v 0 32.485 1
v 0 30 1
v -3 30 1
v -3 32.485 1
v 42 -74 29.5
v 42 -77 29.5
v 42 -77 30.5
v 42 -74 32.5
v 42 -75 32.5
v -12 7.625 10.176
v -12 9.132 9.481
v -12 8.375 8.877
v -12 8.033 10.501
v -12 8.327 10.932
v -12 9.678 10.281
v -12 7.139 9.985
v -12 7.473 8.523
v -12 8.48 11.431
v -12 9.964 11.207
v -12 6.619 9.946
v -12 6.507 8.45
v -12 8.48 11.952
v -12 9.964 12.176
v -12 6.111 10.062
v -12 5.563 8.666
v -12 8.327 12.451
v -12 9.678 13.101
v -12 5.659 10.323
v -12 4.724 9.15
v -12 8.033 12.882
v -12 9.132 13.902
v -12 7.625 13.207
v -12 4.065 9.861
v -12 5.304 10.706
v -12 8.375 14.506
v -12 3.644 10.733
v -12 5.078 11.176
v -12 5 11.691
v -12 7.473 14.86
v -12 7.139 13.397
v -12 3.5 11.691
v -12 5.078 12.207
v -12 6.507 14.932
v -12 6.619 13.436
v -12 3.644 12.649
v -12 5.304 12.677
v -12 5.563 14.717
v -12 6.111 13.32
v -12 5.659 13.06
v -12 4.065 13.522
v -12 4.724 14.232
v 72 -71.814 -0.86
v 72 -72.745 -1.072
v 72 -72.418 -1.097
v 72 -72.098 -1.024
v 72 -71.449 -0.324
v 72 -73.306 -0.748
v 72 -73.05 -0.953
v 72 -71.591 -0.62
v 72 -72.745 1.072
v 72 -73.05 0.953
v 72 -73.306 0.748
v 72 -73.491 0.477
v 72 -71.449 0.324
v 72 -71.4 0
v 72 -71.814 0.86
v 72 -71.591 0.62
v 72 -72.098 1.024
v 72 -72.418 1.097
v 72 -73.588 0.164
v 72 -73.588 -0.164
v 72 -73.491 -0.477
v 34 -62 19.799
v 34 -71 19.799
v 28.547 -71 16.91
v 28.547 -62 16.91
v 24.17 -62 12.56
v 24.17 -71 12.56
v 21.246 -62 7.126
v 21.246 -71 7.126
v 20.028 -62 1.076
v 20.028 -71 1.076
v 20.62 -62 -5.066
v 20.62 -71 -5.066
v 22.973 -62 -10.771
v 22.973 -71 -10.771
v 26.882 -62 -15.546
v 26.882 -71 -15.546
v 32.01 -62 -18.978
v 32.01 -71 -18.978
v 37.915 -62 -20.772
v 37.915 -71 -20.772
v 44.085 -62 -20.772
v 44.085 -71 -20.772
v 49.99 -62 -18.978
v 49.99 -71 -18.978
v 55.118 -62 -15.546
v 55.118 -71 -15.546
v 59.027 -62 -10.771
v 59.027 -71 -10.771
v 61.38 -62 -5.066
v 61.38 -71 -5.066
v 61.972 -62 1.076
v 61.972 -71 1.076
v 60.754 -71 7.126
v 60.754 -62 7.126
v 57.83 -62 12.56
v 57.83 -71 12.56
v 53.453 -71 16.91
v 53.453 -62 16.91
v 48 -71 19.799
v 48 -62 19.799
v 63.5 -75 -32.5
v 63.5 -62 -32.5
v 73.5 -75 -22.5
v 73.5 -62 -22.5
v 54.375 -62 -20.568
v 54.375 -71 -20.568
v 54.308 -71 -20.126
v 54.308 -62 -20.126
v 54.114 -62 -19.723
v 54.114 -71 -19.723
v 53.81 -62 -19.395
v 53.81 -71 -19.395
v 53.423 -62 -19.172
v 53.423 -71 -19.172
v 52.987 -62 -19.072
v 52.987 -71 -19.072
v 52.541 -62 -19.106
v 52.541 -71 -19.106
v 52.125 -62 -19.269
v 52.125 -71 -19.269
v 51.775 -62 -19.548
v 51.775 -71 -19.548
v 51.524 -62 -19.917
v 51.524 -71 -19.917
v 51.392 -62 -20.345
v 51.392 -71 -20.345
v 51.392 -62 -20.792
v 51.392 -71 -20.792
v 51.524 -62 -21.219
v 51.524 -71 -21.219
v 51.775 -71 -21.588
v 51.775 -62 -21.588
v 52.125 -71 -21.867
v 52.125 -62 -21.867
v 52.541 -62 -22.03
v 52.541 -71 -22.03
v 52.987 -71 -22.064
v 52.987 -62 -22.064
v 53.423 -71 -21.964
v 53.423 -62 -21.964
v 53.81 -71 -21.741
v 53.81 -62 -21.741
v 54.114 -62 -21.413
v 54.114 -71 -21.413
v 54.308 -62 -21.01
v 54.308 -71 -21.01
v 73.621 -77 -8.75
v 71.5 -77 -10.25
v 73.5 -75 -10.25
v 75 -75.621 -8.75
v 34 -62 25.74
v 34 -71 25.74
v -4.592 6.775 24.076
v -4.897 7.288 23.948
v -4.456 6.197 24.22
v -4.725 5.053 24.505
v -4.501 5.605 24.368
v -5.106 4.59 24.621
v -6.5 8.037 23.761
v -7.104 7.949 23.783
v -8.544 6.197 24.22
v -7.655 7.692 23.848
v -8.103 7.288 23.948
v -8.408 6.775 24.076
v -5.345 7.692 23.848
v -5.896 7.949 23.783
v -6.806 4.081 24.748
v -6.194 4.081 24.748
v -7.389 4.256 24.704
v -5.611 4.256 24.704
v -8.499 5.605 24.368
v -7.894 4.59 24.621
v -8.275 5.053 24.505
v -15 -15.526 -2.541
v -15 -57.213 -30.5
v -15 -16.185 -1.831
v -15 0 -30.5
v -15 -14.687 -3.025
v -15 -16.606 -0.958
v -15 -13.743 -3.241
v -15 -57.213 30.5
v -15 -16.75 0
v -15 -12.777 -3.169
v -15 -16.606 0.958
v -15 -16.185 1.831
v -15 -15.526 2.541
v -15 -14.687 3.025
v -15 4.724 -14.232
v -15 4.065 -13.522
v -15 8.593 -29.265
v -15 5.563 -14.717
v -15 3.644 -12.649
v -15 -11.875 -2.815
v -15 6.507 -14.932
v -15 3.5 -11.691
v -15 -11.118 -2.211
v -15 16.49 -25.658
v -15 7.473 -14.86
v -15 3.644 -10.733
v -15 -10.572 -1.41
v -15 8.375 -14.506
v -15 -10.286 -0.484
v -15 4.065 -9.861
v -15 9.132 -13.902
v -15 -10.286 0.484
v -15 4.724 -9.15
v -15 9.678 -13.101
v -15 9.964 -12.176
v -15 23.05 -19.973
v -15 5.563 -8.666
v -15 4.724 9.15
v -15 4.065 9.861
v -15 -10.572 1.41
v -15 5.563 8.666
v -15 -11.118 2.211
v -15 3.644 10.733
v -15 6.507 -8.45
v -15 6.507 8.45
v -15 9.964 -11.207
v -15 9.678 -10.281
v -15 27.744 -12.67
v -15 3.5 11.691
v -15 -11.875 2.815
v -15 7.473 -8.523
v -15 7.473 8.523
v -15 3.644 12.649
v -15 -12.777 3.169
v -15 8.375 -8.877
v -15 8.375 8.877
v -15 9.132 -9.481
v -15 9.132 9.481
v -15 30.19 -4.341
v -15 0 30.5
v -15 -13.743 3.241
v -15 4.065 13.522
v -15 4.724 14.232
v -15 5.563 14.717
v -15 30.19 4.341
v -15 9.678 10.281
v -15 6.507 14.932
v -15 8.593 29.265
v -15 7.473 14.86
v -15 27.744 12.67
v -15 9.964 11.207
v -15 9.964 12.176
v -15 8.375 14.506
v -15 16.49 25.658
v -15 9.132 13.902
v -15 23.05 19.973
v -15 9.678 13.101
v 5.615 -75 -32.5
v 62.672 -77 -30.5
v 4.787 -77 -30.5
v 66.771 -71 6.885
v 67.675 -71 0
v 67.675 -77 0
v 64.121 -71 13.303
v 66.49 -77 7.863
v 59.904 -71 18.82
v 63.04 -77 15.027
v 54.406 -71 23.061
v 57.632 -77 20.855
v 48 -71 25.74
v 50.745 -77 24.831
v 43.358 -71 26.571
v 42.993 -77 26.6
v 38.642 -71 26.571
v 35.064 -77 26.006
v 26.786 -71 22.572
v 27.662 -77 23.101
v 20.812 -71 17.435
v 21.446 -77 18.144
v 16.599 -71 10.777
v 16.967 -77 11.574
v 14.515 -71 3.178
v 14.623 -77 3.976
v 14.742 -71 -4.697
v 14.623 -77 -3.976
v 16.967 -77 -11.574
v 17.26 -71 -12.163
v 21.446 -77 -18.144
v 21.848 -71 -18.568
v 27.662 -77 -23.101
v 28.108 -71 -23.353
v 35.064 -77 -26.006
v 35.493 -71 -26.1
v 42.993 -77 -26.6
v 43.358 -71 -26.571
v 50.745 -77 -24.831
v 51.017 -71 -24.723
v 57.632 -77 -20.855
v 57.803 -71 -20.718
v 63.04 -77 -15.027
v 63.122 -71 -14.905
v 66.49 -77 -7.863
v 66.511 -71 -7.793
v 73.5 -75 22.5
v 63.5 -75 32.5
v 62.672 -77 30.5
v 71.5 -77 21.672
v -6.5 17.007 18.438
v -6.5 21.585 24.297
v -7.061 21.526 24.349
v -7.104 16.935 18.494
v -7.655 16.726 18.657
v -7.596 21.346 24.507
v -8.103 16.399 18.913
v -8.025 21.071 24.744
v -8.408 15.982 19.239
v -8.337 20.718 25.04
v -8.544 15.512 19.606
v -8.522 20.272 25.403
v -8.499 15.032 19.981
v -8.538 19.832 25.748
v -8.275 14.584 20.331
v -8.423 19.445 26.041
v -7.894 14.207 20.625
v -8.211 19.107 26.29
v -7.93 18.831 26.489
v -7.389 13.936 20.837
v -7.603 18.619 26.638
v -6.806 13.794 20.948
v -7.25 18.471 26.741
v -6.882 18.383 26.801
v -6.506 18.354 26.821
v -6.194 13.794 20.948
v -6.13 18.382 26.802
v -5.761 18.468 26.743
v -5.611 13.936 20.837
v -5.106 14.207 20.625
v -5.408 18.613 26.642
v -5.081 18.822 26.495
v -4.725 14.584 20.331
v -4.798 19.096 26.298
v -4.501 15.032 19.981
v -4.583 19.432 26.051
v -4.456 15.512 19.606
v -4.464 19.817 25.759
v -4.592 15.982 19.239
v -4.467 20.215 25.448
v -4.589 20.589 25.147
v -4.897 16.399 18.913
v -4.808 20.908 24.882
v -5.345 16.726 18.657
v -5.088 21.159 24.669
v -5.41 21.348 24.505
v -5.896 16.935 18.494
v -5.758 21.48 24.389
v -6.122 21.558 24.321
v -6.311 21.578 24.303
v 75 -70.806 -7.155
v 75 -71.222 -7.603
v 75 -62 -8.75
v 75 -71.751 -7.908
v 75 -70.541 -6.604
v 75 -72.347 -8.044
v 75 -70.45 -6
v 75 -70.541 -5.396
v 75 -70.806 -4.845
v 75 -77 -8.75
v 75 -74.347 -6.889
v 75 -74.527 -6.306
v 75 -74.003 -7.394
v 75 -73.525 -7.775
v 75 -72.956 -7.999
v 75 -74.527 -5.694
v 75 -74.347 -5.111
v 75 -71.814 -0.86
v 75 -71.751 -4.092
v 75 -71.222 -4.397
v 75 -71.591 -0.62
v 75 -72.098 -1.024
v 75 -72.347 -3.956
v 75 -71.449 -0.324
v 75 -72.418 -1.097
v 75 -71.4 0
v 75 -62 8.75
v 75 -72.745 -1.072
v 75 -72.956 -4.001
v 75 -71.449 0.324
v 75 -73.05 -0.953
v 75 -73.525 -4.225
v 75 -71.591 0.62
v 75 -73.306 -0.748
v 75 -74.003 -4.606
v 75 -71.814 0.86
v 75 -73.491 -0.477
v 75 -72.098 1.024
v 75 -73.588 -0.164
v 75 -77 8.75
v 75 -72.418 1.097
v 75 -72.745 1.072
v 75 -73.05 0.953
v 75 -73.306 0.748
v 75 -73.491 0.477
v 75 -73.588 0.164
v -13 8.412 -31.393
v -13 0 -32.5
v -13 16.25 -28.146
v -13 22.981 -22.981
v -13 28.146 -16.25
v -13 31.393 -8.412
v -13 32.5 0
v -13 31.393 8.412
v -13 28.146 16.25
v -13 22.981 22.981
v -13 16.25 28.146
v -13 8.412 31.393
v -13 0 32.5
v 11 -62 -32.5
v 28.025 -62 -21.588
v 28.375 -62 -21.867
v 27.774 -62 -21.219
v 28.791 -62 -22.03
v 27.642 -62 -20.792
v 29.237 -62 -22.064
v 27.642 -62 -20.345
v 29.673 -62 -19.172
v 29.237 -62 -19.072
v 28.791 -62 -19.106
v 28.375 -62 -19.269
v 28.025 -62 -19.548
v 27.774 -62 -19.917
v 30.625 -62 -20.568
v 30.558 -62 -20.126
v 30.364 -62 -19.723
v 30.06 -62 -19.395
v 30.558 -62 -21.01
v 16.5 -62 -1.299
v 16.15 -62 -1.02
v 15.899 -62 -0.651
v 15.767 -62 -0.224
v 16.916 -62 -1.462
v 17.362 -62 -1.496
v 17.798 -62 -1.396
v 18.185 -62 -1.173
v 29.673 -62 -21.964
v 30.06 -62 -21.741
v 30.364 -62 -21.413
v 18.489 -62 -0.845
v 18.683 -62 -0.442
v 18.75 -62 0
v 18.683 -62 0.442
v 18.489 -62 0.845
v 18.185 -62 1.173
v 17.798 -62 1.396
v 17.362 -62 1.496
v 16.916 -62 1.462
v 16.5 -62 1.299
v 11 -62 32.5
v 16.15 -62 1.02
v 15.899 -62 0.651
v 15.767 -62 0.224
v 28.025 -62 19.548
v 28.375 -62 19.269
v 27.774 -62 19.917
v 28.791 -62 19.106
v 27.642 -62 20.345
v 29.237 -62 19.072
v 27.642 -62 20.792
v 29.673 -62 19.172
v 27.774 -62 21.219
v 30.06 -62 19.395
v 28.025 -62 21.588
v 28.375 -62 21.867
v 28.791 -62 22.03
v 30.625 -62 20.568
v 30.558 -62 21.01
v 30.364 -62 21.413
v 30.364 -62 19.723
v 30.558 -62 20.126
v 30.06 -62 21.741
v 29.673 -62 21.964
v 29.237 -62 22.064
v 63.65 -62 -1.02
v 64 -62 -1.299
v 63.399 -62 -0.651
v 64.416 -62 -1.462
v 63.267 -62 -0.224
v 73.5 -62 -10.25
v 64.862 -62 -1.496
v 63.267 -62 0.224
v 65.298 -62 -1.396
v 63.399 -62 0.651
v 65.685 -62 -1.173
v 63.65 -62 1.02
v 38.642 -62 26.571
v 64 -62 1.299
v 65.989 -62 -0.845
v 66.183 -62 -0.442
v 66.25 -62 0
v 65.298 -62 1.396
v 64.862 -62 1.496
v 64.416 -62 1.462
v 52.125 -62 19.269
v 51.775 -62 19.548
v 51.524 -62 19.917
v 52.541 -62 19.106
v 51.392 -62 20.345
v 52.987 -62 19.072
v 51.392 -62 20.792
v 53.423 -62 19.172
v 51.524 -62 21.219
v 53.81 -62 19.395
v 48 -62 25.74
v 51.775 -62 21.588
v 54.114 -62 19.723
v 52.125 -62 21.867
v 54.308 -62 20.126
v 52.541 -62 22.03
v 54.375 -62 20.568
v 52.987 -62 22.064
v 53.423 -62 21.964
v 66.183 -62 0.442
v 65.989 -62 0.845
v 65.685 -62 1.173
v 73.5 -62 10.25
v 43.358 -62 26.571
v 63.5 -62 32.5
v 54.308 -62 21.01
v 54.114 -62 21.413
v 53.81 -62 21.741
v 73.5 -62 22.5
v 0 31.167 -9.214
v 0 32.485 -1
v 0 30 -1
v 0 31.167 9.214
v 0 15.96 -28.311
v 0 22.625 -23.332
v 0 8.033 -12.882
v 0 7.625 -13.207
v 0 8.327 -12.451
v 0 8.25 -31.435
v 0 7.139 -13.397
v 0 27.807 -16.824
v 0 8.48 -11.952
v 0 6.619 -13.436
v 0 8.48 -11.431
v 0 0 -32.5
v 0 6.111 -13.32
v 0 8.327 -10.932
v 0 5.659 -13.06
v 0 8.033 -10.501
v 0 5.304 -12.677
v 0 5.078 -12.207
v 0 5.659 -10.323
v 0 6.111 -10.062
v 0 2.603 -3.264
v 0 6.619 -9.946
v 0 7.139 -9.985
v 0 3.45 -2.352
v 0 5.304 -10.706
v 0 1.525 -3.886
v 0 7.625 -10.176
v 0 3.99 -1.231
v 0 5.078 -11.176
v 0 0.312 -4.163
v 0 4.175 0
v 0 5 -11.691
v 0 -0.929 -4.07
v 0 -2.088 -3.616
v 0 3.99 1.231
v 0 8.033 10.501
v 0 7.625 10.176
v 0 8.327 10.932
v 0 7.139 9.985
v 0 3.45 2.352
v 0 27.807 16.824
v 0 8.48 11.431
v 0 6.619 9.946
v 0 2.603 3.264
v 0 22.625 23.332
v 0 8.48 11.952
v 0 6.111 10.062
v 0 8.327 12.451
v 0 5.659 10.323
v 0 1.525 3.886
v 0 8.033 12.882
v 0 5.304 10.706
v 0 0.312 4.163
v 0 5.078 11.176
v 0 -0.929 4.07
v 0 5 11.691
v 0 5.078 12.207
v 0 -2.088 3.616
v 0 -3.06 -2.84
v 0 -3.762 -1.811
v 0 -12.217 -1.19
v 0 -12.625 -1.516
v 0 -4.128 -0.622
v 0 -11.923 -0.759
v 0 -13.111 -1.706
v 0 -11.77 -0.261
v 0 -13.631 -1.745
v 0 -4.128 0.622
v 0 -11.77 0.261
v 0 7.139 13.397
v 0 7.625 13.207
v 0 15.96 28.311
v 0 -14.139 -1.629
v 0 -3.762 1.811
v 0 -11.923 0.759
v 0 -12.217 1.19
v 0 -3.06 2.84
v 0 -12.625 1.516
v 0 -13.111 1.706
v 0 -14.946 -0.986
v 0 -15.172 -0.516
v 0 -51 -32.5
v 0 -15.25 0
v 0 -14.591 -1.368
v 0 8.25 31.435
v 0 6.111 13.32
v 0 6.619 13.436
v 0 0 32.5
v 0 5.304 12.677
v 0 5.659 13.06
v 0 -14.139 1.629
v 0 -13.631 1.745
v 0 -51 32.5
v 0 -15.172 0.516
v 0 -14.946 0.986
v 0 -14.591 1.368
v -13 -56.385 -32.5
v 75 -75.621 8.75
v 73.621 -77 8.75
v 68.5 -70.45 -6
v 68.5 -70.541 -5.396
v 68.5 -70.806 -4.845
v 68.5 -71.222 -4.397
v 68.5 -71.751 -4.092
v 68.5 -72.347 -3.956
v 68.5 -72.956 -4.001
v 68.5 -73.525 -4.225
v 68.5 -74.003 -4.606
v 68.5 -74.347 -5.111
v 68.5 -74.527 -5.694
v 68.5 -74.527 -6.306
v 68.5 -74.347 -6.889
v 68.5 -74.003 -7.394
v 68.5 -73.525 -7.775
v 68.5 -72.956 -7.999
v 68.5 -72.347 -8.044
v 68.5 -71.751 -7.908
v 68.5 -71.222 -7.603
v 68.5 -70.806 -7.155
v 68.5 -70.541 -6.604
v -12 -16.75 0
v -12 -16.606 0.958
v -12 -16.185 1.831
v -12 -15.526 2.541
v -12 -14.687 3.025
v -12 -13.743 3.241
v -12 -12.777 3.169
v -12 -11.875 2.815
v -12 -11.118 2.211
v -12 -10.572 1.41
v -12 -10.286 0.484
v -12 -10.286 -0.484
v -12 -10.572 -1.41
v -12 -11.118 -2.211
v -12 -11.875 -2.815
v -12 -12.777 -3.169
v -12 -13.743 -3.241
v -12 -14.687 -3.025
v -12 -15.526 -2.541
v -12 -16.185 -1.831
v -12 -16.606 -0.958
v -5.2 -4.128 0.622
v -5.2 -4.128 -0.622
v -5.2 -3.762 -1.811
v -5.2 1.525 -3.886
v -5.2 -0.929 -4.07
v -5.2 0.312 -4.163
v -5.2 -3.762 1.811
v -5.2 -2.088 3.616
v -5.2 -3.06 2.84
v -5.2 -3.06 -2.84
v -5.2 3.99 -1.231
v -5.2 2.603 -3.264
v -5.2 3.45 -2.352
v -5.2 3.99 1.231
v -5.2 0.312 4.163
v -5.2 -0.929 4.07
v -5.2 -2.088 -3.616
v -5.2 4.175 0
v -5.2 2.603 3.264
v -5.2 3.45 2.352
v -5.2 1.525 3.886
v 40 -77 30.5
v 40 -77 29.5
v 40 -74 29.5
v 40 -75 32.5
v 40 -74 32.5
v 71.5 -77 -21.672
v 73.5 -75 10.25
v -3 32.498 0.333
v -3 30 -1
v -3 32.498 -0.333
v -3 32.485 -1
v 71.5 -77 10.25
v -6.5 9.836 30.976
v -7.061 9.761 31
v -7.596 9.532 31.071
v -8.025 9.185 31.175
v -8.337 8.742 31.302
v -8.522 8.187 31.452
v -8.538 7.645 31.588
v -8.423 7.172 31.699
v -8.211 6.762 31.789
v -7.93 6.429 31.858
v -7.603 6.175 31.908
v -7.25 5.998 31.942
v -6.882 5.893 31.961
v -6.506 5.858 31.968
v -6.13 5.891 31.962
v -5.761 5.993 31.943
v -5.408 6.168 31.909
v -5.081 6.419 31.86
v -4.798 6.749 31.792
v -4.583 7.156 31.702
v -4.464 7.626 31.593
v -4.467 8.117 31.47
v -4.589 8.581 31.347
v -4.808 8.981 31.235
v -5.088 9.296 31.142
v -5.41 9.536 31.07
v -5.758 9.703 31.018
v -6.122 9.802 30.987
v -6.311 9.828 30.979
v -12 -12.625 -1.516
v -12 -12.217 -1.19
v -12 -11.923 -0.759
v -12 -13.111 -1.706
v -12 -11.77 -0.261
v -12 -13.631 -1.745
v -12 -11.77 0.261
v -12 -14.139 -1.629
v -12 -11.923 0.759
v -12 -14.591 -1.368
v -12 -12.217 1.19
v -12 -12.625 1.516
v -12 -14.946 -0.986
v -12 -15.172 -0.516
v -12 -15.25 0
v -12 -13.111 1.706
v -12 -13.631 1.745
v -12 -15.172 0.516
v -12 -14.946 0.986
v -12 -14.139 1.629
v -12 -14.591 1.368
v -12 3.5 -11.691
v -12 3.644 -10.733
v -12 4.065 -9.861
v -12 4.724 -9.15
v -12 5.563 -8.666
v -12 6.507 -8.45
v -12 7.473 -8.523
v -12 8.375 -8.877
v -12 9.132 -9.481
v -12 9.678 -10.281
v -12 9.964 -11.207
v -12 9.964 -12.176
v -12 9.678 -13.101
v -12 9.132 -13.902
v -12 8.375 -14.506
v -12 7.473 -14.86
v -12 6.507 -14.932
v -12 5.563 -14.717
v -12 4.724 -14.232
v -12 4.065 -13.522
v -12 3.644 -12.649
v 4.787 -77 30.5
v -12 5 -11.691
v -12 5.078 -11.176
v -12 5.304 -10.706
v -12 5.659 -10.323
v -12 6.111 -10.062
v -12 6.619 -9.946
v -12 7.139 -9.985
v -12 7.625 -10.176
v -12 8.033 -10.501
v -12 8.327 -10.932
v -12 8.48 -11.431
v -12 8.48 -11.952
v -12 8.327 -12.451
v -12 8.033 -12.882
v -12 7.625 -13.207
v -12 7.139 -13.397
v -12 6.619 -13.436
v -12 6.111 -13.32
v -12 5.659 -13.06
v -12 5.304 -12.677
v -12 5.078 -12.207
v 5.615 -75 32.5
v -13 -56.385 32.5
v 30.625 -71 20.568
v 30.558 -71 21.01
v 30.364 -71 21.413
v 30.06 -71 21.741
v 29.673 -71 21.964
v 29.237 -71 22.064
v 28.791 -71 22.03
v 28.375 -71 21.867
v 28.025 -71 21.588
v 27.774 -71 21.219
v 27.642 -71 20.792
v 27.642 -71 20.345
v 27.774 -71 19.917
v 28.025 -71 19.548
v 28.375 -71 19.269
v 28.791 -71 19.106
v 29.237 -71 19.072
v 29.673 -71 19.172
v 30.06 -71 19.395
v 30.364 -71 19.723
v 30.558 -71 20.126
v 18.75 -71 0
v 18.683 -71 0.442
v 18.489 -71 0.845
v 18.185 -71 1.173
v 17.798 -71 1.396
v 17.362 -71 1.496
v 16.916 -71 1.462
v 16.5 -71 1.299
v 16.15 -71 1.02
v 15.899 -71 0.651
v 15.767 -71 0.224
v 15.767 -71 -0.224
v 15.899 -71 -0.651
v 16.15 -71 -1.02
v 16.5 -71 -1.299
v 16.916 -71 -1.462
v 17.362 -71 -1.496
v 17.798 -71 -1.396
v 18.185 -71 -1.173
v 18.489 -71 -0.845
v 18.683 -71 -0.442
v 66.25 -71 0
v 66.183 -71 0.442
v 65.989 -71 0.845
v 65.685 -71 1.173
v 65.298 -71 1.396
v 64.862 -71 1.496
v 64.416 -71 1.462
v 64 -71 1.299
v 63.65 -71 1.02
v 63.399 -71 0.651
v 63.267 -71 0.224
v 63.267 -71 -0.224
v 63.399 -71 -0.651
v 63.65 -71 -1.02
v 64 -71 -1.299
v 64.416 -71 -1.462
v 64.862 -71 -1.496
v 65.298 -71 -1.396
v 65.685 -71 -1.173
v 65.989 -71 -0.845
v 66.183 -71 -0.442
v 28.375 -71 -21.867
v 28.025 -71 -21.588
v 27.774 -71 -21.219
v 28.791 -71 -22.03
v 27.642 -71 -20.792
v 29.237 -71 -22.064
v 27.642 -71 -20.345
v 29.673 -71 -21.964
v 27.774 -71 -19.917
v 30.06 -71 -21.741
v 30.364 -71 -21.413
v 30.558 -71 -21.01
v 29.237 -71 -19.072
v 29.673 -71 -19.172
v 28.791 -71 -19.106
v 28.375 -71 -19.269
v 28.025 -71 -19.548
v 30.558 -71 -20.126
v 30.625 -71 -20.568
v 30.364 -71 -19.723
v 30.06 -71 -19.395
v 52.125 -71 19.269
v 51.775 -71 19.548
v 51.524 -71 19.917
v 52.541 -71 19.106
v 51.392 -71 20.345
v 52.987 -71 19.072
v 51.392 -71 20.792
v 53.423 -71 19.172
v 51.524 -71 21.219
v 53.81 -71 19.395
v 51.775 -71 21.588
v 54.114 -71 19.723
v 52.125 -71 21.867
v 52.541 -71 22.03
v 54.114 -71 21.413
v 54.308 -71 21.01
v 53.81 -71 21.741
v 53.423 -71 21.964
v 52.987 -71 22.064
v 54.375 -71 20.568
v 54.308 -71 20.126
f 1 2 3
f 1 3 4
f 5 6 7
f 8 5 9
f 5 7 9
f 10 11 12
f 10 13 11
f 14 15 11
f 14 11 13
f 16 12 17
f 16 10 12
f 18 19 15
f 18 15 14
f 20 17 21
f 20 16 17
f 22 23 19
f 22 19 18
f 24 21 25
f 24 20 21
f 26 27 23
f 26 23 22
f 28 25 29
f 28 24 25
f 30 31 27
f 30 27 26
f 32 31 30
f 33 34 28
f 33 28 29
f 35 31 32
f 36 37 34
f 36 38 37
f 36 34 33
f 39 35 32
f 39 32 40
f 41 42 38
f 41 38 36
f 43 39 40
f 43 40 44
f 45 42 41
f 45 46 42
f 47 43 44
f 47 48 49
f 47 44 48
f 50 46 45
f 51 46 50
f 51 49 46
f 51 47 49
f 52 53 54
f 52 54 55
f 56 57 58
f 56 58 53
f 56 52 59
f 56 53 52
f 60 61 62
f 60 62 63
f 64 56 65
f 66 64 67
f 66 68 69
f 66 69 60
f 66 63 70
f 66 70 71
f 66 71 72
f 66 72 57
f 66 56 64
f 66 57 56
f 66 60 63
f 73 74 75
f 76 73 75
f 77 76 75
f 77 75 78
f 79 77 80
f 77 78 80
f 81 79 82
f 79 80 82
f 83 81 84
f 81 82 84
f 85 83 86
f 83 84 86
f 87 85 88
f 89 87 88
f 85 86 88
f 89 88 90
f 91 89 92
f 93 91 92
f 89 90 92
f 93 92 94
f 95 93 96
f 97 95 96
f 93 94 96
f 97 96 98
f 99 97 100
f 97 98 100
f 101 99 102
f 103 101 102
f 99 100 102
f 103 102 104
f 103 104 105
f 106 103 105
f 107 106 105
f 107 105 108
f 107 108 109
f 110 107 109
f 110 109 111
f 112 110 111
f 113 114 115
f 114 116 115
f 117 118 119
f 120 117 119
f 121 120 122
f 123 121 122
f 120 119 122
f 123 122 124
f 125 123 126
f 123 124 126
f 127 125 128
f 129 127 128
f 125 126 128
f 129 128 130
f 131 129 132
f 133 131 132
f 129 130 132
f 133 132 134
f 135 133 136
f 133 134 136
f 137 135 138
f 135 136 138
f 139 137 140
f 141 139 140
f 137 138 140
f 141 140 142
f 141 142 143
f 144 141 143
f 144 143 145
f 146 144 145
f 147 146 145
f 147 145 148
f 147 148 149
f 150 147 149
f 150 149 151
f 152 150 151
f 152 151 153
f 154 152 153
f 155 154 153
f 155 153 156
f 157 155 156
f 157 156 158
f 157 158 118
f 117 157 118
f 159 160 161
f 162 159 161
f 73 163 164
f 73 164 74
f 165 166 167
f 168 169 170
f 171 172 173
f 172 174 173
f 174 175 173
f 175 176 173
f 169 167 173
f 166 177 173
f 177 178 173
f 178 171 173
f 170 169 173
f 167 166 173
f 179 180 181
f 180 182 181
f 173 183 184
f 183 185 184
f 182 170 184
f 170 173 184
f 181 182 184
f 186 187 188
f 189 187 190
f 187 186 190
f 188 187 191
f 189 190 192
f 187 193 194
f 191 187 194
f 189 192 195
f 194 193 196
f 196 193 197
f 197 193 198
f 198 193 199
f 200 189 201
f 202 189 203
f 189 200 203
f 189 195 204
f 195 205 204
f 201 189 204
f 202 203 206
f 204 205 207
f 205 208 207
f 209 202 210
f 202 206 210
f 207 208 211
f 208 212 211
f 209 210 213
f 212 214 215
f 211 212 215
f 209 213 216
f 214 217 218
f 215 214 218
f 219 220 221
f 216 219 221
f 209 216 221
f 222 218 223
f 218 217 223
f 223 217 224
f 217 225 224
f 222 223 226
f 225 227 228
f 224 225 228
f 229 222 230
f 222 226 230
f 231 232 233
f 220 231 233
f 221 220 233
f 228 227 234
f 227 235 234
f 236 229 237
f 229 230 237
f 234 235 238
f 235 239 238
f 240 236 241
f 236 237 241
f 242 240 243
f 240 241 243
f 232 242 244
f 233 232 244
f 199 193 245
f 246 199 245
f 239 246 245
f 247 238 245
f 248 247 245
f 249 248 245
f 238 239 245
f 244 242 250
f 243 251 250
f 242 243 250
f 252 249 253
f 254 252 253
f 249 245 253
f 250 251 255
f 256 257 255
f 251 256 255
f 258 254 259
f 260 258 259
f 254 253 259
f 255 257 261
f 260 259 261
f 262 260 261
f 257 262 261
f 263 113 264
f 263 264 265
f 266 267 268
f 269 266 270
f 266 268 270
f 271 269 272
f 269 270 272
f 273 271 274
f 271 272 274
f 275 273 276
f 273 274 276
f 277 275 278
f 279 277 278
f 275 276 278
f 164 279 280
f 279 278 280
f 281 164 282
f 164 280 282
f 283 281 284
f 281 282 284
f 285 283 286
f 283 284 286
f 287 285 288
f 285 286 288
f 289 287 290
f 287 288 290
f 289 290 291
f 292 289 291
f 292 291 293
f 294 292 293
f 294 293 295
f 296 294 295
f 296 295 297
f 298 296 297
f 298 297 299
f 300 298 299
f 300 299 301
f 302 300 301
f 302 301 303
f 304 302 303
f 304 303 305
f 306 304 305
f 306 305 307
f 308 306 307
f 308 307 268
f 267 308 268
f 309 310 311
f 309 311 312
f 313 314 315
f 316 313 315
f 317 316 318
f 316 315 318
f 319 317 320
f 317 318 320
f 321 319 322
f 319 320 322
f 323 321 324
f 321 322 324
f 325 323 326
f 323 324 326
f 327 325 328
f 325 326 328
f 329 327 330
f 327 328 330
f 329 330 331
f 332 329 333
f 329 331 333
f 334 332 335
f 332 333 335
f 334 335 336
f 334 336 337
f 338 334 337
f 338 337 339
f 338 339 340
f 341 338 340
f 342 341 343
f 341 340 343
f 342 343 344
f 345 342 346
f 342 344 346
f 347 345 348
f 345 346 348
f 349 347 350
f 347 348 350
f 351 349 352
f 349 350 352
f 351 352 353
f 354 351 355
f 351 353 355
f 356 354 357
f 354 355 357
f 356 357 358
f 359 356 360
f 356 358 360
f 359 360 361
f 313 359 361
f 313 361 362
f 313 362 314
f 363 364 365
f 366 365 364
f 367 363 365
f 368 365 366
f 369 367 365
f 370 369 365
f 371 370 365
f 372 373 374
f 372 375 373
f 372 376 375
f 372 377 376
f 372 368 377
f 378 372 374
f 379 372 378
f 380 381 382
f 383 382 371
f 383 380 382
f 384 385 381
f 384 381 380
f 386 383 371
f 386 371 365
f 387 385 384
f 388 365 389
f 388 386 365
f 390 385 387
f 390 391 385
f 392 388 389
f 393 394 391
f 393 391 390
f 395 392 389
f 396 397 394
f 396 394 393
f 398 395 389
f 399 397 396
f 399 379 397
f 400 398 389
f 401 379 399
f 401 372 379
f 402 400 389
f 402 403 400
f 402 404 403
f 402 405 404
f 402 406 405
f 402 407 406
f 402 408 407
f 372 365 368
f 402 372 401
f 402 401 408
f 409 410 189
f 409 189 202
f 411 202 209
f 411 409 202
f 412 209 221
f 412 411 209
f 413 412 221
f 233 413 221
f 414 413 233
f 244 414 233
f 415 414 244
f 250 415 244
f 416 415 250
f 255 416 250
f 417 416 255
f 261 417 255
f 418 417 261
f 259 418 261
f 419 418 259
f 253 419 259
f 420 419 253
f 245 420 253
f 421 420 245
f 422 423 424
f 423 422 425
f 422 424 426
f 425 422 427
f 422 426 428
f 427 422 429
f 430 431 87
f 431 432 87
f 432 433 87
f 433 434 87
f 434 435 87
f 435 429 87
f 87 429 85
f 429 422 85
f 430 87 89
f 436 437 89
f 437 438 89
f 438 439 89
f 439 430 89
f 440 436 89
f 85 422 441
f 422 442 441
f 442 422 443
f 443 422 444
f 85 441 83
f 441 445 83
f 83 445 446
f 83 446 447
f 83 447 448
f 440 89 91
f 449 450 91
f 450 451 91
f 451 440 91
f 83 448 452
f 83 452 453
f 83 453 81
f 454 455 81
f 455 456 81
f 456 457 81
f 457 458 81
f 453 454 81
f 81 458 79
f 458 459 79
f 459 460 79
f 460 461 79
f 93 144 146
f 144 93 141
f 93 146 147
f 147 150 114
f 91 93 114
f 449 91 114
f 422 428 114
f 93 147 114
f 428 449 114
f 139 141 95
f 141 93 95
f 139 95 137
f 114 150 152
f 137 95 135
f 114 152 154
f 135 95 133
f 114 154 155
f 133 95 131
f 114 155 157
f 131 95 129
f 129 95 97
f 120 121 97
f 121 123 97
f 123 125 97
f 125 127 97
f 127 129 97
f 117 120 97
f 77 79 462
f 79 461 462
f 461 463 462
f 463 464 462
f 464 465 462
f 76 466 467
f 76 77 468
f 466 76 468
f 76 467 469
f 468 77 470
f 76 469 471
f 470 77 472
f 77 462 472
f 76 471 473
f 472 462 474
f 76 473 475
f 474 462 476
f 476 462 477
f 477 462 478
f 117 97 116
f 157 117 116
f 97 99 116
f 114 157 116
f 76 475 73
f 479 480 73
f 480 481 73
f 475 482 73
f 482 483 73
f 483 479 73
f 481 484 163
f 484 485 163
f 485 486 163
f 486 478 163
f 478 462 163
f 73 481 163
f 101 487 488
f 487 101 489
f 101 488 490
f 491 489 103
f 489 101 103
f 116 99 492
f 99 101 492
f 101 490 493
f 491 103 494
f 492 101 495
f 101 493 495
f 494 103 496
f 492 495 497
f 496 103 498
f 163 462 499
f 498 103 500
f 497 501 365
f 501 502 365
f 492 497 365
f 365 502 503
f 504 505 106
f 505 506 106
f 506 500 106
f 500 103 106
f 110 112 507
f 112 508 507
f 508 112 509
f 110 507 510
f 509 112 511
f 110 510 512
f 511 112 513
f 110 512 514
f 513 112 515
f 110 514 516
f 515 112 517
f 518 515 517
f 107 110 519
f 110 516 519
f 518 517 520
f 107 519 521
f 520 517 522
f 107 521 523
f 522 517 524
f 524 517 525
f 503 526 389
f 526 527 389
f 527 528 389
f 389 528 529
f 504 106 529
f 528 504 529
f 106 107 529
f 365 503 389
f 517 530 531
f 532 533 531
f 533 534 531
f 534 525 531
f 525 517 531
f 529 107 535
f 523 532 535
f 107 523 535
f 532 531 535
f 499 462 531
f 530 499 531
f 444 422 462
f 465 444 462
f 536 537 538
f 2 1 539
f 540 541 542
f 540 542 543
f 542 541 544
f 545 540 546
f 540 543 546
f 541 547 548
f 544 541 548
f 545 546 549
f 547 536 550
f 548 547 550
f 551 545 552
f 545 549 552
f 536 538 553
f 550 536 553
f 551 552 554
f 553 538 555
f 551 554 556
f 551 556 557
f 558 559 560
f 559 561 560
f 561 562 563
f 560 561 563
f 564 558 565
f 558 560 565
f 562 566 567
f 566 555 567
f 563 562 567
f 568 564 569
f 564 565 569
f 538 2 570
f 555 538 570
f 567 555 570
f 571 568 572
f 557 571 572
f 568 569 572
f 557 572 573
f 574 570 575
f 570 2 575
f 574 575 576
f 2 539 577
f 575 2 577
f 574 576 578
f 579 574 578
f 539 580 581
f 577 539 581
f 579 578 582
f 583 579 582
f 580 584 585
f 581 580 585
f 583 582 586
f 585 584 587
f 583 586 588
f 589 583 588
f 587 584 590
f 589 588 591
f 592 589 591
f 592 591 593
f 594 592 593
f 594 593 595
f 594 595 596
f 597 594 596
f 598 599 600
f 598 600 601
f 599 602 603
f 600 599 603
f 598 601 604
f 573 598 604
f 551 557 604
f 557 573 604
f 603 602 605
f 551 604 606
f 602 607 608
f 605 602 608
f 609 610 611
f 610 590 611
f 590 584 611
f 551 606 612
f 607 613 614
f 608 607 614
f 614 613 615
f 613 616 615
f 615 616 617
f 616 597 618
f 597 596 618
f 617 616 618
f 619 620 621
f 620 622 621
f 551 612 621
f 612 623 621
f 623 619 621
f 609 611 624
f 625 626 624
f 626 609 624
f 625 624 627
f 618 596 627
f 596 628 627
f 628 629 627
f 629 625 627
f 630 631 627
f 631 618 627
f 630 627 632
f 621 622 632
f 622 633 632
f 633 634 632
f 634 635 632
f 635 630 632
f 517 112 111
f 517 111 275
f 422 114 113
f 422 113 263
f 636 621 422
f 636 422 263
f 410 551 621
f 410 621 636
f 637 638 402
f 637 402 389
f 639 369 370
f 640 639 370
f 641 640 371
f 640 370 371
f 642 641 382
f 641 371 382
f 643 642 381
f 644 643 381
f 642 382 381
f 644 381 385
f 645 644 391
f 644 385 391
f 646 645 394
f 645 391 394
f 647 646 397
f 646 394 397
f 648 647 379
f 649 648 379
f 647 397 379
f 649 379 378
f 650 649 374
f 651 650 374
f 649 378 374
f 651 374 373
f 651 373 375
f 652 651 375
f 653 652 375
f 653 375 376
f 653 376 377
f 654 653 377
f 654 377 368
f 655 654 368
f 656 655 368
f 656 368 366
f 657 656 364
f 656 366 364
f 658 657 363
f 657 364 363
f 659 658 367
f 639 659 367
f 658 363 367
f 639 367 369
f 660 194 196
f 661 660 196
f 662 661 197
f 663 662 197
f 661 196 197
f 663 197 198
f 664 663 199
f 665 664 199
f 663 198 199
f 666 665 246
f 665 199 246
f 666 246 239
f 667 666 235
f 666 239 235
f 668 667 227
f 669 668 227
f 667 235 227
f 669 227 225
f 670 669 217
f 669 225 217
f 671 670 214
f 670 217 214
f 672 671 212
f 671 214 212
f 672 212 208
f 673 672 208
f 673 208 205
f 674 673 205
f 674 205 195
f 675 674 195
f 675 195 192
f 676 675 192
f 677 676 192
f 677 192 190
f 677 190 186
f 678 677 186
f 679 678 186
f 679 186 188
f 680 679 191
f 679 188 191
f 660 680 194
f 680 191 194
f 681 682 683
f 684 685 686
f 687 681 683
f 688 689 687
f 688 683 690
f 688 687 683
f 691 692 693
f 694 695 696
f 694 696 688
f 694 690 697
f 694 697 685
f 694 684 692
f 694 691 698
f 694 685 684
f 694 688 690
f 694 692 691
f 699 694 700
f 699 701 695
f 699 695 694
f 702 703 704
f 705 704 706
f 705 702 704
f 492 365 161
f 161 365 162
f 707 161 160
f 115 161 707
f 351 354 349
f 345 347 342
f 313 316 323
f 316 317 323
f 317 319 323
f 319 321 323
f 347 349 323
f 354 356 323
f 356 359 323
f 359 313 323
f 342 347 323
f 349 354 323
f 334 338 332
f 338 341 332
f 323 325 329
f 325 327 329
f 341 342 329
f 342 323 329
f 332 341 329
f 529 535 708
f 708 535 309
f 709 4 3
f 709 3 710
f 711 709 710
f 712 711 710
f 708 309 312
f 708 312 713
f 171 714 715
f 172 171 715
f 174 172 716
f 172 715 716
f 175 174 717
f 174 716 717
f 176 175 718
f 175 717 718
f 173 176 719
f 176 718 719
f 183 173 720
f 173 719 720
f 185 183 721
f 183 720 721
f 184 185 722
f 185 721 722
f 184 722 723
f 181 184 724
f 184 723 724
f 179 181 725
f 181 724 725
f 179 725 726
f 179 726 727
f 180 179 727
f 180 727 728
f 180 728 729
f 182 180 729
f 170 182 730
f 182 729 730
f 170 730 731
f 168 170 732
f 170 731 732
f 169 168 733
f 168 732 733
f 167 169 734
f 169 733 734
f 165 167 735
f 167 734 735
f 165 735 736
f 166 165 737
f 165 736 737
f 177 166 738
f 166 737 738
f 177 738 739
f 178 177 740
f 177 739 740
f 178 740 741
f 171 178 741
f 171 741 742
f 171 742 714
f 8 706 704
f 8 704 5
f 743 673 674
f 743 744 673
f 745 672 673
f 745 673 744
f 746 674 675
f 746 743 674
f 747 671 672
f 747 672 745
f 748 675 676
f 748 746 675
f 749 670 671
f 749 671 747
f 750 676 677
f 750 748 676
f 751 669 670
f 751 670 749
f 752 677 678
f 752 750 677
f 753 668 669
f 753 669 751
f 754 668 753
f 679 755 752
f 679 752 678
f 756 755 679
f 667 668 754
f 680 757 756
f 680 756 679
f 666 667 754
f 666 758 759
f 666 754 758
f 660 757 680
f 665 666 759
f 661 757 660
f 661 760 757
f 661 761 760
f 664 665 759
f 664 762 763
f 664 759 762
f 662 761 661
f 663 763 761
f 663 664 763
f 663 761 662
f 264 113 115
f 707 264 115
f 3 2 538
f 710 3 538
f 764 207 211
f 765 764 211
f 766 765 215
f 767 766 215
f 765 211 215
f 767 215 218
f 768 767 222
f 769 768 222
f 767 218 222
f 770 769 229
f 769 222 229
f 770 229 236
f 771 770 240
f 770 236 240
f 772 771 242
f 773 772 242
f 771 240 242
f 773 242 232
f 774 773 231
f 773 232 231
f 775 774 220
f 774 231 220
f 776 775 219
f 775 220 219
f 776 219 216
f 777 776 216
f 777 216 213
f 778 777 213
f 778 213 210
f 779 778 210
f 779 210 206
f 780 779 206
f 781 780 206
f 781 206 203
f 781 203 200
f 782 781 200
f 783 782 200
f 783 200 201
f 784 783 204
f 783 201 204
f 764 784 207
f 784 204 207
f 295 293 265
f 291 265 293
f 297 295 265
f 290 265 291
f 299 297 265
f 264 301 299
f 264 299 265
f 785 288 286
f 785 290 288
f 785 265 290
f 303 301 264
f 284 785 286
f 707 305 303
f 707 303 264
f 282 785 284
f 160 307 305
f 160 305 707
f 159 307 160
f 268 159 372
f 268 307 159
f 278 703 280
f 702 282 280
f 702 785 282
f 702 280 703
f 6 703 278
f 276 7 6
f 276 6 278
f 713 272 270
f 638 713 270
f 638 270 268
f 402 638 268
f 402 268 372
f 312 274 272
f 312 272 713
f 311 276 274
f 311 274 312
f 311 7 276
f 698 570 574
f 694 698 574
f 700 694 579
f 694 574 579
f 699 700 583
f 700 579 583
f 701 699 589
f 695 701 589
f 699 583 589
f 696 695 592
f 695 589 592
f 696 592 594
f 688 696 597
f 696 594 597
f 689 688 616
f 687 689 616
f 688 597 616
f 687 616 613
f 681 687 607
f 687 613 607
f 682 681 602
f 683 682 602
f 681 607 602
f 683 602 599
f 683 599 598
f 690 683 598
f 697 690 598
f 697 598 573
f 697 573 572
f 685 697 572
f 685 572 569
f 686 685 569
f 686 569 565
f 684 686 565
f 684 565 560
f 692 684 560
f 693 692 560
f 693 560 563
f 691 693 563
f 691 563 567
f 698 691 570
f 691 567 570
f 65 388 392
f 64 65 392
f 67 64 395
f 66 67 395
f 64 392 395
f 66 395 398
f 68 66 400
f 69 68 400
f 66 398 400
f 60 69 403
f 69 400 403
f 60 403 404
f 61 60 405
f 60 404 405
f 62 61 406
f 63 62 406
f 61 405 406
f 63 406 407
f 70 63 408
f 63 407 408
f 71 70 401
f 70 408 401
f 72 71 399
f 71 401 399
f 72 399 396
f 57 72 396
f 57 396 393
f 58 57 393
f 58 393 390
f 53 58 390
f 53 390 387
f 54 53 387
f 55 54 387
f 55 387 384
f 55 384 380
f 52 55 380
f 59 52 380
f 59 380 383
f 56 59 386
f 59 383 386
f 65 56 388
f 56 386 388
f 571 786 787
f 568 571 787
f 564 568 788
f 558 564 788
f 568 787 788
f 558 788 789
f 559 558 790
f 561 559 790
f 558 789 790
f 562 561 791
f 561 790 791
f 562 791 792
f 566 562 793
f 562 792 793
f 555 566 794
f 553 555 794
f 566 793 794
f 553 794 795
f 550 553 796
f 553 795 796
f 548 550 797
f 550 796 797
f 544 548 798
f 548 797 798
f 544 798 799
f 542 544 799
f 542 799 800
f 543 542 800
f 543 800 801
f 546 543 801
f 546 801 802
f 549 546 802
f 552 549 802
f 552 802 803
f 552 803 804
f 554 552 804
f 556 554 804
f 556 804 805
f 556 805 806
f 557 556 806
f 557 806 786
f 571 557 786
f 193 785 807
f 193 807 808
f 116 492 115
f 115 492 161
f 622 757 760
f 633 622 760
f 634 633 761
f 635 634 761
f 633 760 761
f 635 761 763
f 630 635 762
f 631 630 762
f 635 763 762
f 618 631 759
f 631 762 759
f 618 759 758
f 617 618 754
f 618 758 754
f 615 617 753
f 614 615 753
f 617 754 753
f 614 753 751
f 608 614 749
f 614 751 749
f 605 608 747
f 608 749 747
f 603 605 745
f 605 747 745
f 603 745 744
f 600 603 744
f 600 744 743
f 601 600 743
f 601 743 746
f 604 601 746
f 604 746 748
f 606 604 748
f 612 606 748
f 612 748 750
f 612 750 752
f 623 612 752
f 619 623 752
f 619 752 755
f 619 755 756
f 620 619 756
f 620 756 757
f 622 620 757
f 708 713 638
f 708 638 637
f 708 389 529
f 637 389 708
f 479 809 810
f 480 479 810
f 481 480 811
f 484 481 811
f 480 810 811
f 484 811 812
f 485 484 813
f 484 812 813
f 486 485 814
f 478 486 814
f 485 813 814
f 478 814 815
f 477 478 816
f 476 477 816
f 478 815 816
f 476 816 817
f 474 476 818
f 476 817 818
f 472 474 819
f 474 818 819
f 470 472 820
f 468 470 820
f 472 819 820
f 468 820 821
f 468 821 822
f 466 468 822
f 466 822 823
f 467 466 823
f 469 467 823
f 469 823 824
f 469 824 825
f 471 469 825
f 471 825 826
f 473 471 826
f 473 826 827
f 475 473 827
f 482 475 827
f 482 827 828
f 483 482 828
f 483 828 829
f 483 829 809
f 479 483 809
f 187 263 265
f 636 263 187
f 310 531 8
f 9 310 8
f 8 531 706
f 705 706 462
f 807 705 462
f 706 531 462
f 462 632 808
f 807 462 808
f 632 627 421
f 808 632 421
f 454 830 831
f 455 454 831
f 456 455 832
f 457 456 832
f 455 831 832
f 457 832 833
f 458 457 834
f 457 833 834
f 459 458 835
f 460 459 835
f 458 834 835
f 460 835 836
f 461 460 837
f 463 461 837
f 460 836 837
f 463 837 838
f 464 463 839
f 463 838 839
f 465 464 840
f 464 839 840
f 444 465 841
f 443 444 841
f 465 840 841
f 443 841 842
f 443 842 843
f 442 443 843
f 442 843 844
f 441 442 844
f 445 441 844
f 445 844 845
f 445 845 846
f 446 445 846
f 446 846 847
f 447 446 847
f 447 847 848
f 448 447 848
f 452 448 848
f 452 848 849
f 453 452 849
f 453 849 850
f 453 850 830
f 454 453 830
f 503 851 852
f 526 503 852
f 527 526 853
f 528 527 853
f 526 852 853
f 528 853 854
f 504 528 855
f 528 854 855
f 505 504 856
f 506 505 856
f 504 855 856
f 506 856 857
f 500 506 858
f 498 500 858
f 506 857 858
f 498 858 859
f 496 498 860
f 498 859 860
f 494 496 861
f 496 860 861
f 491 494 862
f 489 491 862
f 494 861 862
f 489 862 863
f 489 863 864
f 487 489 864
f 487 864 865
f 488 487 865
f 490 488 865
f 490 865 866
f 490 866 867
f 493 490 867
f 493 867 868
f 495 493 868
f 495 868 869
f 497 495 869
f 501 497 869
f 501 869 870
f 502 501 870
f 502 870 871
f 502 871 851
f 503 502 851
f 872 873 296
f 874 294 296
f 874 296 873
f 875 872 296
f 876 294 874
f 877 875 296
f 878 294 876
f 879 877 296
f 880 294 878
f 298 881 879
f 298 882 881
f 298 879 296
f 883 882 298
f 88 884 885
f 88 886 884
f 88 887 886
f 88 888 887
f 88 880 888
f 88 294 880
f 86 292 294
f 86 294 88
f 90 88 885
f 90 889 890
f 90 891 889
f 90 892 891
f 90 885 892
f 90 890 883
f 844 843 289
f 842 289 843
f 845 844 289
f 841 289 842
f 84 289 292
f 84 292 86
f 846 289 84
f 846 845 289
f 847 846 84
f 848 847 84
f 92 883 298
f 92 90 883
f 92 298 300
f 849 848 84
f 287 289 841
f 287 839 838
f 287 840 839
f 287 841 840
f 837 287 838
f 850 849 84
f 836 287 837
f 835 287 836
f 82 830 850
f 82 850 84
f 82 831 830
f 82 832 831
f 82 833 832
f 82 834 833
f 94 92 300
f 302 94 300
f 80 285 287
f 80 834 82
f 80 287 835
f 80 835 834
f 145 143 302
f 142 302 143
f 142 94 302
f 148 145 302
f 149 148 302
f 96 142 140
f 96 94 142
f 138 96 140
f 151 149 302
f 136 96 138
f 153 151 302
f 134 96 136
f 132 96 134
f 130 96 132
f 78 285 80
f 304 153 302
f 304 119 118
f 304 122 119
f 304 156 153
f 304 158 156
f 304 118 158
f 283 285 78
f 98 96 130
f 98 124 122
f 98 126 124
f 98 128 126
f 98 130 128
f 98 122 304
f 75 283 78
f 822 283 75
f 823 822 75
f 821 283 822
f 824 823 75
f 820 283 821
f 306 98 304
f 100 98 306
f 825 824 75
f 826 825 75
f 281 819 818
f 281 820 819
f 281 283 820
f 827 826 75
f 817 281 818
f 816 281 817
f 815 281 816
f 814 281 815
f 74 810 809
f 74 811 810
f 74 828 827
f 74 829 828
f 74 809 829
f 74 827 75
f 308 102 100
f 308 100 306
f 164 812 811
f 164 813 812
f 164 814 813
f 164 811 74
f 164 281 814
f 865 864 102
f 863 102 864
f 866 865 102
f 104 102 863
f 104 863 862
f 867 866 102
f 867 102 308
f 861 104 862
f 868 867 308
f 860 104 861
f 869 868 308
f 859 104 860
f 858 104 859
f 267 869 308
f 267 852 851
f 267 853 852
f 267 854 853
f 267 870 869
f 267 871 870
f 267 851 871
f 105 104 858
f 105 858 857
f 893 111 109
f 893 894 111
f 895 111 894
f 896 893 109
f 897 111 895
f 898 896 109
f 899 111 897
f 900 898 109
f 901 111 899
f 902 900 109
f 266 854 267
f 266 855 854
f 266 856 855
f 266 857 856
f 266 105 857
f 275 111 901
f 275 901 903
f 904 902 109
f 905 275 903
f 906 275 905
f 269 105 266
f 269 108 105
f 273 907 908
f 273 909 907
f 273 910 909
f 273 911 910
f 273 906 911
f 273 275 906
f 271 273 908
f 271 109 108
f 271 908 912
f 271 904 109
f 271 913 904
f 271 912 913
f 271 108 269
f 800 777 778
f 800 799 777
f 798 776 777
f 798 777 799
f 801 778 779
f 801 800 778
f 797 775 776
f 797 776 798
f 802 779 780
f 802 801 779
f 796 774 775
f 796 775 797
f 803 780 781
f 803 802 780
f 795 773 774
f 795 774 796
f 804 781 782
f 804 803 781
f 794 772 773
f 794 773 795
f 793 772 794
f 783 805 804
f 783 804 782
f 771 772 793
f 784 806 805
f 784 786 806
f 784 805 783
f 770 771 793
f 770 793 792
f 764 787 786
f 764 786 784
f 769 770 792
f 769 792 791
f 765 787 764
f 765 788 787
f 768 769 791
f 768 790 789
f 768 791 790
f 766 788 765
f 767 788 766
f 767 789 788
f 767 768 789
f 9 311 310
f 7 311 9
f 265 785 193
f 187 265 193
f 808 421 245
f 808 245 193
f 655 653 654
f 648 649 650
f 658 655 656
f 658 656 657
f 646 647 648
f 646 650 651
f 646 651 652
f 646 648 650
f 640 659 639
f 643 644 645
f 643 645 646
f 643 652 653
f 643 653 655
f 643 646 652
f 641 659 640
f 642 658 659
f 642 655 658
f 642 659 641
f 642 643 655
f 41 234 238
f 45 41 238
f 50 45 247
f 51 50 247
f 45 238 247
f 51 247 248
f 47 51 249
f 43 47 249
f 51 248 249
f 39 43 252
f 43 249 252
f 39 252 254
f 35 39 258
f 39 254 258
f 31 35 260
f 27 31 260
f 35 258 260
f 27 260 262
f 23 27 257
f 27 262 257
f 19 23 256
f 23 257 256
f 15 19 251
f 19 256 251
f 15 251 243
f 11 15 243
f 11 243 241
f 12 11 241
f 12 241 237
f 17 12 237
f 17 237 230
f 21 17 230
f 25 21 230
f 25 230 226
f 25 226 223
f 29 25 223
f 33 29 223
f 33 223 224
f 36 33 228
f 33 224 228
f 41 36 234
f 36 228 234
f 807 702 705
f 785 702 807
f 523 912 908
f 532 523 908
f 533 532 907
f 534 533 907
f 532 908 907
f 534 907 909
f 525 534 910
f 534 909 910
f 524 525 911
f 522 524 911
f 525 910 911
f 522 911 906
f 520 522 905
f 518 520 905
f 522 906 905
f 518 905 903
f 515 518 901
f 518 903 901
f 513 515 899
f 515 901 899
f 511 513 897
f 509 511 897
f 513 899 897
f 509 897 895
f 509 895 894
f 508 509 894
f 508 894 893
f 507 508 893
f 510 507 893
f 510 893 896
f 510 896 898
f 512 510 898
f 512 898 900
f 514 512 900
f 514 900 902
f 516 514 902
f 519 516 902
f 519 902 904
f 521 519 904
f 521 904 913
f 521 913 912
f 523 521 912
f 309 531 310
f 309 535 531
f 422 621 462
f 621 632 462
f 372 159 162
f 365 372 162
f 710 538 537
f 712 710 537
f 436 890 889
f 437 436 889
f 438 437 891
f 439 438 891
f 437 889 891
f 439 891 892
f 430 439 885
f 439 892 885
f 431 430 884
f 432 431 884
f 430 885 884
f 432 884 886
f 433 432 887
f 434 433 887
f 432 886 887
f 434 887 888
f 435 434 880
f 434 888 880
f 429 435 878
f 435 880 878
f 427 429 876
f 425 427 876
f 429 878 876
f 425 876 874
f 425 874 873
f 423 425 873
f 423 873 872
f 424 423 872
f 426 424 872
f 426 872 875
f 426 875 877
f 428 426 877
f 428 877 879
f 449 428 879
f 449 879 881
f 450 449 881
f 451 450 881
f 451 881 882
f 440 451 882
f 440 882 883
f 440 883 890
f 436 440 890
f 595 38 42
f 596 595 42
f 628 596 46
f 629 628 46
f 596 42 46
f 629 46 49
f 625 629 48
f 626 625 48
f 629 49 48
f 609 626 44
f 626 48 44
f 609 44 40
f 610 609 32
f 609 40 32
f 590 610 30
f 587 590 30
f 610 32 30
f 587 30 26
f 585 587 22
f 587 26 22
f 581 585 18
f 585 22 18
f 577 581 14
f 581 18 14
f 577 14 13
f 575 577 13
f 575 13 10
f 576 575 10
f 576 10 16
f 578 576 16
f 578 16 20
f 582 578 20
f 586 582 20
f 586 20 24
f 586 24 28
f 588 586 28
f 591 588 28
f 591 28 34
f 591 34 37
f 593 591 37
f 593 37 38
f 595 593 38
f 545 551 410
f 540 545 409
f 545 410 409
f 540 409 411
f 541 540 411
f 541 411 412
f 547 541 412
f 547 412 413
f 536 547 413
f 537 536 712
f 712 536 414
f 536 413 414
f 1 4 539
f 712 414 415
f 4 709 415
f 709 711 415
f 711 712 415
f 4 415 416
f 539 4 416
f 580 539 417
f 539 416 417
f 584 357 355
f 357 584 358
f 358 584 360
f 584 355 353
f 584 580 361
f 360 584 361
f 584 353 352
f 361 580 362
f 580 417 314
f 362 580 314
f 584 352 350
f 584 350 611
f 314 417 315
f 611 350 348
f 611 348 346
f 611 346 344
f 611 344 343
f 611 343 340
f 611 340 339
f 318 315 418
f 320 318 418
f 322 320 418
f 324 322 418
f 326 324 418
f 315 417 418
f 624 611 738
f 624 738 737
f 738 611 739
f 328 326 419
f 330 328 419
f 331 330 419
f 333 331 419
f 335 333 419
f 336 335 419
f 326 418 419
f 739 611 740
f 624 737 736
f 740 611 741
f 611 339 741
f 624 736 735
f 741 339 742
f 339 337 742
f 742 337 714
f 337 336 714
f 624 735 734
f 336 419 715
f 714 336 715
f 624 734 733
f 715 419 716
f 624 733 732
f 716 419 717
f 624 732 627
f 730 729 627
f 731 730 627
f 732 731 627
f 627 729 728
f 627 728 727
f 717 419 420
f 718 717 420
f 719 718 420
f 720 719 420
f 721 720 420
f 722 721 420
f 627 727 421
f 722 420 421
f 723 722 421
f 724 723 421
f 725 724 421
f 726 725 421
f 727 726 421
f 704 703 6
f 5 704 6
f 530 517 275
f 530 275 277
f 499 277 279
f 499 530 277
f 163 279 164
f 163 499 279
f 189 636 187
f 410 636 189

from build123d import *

# Parameters (mm, degrees)
EXTRUDE_1_DEPTH          = 32.5
SKETCH_2_R               = 1.75
CUT_EXTRUDE_1_DEPTH      = 122.727153914
SKETCH_3_R               = 26.675
CUT_EXTRUDE_2_DEPTH      = 6
CUT_EXTRUDE_3_REACH      = 133.037
SKETCH_4_R               = 1.5
SKETCH_4_R_2             = 21
SKETCH_5_R               = 4.175
CUT_EXTRUDE_4_DEPTH      = 5.2
CHAMFER_1_SIZE           = 10
CUT_EXTRUDE_START        = -9
CUT_EXTRUDE_5_DEPTH      = 9
SKETCH_7_R               = 3.25
CUT_EXTRUDE_6_DEPTH      = 3
CHAMFER_2_SIZE           = 2
PATTERN_CIRCULAR_1_COUNT = 2
PATTERN_CIRCULAR_1_ANGLE = 24
SKETCH_10_W              = 2
SKETCH_10_H              = 3
CUT_EXTRUDE_7_DEPTH      = 3
SKETCH_11_W              = 3.5
SKETCH_11_H              = 17.5
EXTRUDE_2_DEPTH          = 15
CHAMFER_3_SIZE           = 1.5
SKETCH_12_R              = 1.1
CUT_EXTRUDE_8_DEPTH      = 3
SKETCH_13_R              = 2.05
CUT_EXTRUDE_9_DEPTH      = 6.5
SKETCH_14_W              = 2
SKETCH_14_H              = 3
CUT_EXTRUDE_10_DEPTH     = 3


with BuildPart() as part:
    # Эскиз1 → Бобышка-Вытянуть1 (new, symmetric)
    with BuildSketch(Plane.XY):
        Polygon((0, 40), (0, -51), (11, -62), (73.5, -62), (73.5, -77), (4.786796564, -77), (-15, -57.213203436), (-15, 40), align=None)
    extrude(amount=EXTRUDE_1_DEPTH, both=True)

    # Эскиз2 → Вырез-Вытянуть1 (cut, through all)
    with BuildSketch(Plane.ZY.offset(15)):
        with BuildLine():
            Line((32.5, 0), (32.5, 40))
            Line((32.5, 40), (-32.5, 40))
            Line((-32.5, 40), (-32.5, 0))
            ThreePointArc((-32.5, 0), (0, 32.5), (32.5, 0))
        make_face()
        with Locations(Location((0, -13.5, 0), (0, 0, 270))):
            Circle(SKETCH_2_R)
        with Locations(Location((11.691342951, 6.75, 0), (0, 0, 270))):
            Circle(SKETCH_2_R)
        with Locations(Location((-11.691342951, 6.75, 0), (0, 0, 270))):
            Circle(SKETCH_2_R)
    extrude(amount=-CUT_EXTRUDE_1_DEPTH, mode=Mode.SUBTRACT)

    # Эскиз3 → Вырез-Вытянуть2 (cut)
    with BuildSketch(Plane.XZ.offset(77)):
        with Locations((41, 0)):
            Circle(SKETCH_3_R)
    extrude(amount=-CUT_EXTRUDE_2_DEPTH, mode=Mode.SUBTRACT)

    # Эскиз4 → Вырез-Вытянуть3 (cut, up to next)
    with BuildSketch(Plane.XZ.offset(71), mode=Mode.PRIVATE) as cut_extrude_3_sk1:
        with Locations((64.75, 0)):
            Circle(SKETCH_4_R)
    cut_extrude_3_tool1 = extrude(cut_extrude_3_sk1.sketch, amount=-CUT_EXTRUDE_3_REACH, mode=Mode.PRIVATE) & part.part
    # Эскиз4 → Вырез-Вытянуть3 (cut, up to next)
    with BuildSketch(Plane.XZ.offset(71), mode=Mode.PRIVATE) as cut_extrude_3_sk2:
        with Locations((52.875, -20.56810334)):
            Circle(SKETCH_4_R)
    cut_extrude_3_tool2 = extrude(cut_extrude_3_sk2.sketch, amount=-CUT_EXTRUDE_3_REACH, mode=Mode.PRIVATE) & part.part
    # Эскиз4 → Вырез-Вытянуть3 (cut, up to next)
    with BuildSketch(Plane.XZ.offset(71), mode=Mode.PRIVATE) as cut_extrude_3_sk3:
        with Locations((29.125, -20.56810334)):
            Circle(SKETCH_4_R)
    cut_extrude_3_tool3 = extrude(cut_extrude_3_sk3.sketch, amount=-CUT_EXTRUDE_3_REACH, mode=Mode.PRIVATE) & part.part
    # Эскиз4 → Вырез-Вытянуть3 (cut, up to next)
    with BuildSketch(Plane.XZ.offset(71), mode=Mode.PRIVATE) as cut_extrude_3_sk4:
        with Locations((17.25, 0)):
            Circle(SKETCH_4_R)
    cut_extrude_3_tool4 = extrude(cut_extrude_3_sk4.sketch, amount=-CUT_EXTRUDE_3_REACH, mode=Mode.PRIVATE) & part.part
    # Эскиз4 → Вырез-Вытянуть3 (cut, up to next)
    with BuildSketch(Plane.XZ.offset(71), mode=Mode.PRIVATE) as cut_extrude_3_sk5:
        with Locations((29.125, 20.56810334)):
            Circle(SKETCH_4_R)
    cut_extrude_3_tool5 = extrude(cut_extrude_3_sk5.sketch, amount=-CUT_EXTRUDE_3_REACH, mode=Mode.PRIVATE) & part.part
    # Эскиз4 → Вырез-Вытянуть3 (cut, up to next)
    with BuildSketch(Plane.XZ.offset(71), mode=Mode.PRIVATE) as cut_extrude_3_sk6:
        with Locations((52.875, 20.56810334)):
            Circle(SKETCH_4_R)
    cut_extrude_3_tool6 = extrude(cut_extrude_3_sk6.sketch, amount=-CUT_EXTRUDE_3_REACH, mode=Mode.PRIVATE) & part.part
    # Эскиз4 → Вырез-Вытянуть3 (cut, up to next)
    with BuildSketch(Plane.XZ.offset(71), mode=Mode.PRIVATE) as cut_extrude_3_sk7:
        with Locations((41, 0)):
            Circle(SKETCH_4_R_2)
    cut_extrude_3_tool7 = extrude(cut_extrude_3_sk7.sketch, amount=-CUT_EXTRUDE_3_REACH, mode=Mode.PRIVATE) & part.part
    add(cut_extrude_3_tool1.solids().sort_by_distance((64.75, -71, 0))[0], mode=Mode.SUBTRACT)
    add(cut_extrude_3_tool2.solids().sort_by_distance((52.875, -71, -20.568103))[0], mode=Mode.SUBTRACT)
    add(cut_extrude_3_tool3.solids().sort_by_distance((29.125, -71, -20.568103))[0], mode=Mode.SUBTRACT)
    add(cut_extrude_3_tool4.solids().sort_by_distance((17.25, -71, 0))[0], mode=Mode.SUBTRACT)
    add(cut_extrude_3_tool5.solids().sort_by_distance((29.125, -71, 20.568103))[0], mode=Mode.SUBTRACT)
    add(cut_extrude_3_tool6.solids().sort_by_distance((52.875, -71, 20.568103))[0], mode=Mode.SUBTRACT)
    add(cut_extrude_3_tool7.solids().sort_by_distance((41, -71, 0))[0], mode=Mode.SUBTRACT)

    # Эскиз5 → Вырез-Вытянуть4 (cut)
    with BuildSketch(Plane(origin=(0, 0, 0), x_dir=(0, 0, -1), z_dir=(1, 0, 0))):
        with Locations(Location((0, 0, 0), (0, 0, 90))):
            Circle(SKETCH_5_R)
    extrude(amount=-CUT_EXTRUDE_4_DEPTH, mode=Mode.SUBTRACT)

    # Фаска1
    chamfer_1_edges = [part.edges().sort_by_distance(p)[0] for p in [
        (73.5, -69.5, 32.5),
        (73.5, -69.5, -32.5),
    ]]
    chamfer(chamfer_1_edges, length=CHAMFER_1_SIZE)

    # Эскиз6 → Вырез-Вытянуть5 (cut)
    with BuildSketch(Plane.XZ.offset(71).offset(CUT_EXTRUDE_START)):
        with BuildLine():
            ThreePointArc((34, 19.798989873), (41, 21), (48, 19.798989873))
            Line((48, 19.798989873), (48, 25.740155885))
            ThreePointArc((48, 25.740155885), (41, 26.675), (34, 25.740155885))
            Line((34, 25.740155885), (34, 19.798989873))
        make_face()
    extrude(amount=CUT_EXTRUDE_5_DEPTH, mode=Mode.SUBTRACT)

    # Эскиз7 → Вырез-Вытянуть6 (cut)
    with BuildSketch(Plane.ZY.offset(15)):
        with Locations(Location((11.691342951, 6.75, 0), (0, 0, 270))):
            Circle(SKETCH_7_R)
        with Locations(Location((0, -13.5, 0), (0, 0, 270))):
            Circle(SKETCH_7_R)
        with Locations(Location((-11.691342951, 6.75, 0), (0, 0, 270))):
            Circle(SKETCH_7_R)
    extrude(amount=-CUT_EXTRUDE_6_DEPTH, mode=Mode.SUBTRACT)

    # Фаска2
    chamfer_2_edges = [part.edges().sort_by_distance(p)[0] for p in [
        (73.5, -77, 0),
        (34.143398282, -77, -32.5),
        (68.5, -77, 27.5),
        (68.5, -77, -27.5),
        (-5.106601718, -67.106601718, -32.5),
        (-5.106601718, -67.106601718, 32.5),
        (34.143398282, -77, 32.5),
        (-15, -28.606601718, -32.5),
        (-15, -28.606601718, 32.5),
        (-15, 32.5, 0),
    ]]
    chamfer(chamfer_2_edges, length=CHAMFER_2_SIZE)

    # Эскиз9 → Вырез-Повернуть1 (revolve, cut)
    with BuildSketch(Plane(origin=(-6.5, 0, 0), x_dir=(0, 0, -1), z_dir=(1, 0, 0))):
        Polygon((-19.70026884, 15.391536883), (-18.438162816, 17.006958928), (-24.742248845, 21.932250731), (-26.004354869, 20.316828686), align=None)
    cut_revolve_1 = revolve(axis=Axis((-6.5, 0, 0), (0, 0.6156614753256564, 0.7880107536067235)), mode=Mode.SUBTRACT)

    # Круговой массив1: Вырез-Повернуть1 ×2 about axis
    pattern_circular_1_axis = Axis((73.5, 0, 0), (1, 0, 0))
    for i in range(1, PATTERN_CIRCULAR_1_COUNT):
        add(cut_revolve_1.rotate(pattern_circular_1_axis, i * PATTERN_CIRCULAR_1_ANGLE / (PATTERN_CIRCULAR_1_COUNT - 1)), mode=Mode.SUBTRACT)

    # Эскиз10 → Вырез-Вытянуть7 (cut)
    with BuildSketch(Plane(origin=(0, 0, 0), x_dir=(0, 0, -1), z_dir=(1, 0, 0))):
        with Locations((0, 31.5)):
            Rectangle(SKETCH_10_W, SKETCH_10_H)
    extrude(amount=-CUT_EXTRUDE_7_DEPTH, mode=Mode.SUBTRACT)

    # Эскиз11 → Бобышка-Вытянуть2 (add)
    with BuildSketch(Plane.XZ.offset(77)):
        with Locations((73.25, 0)):
            Rectangle(SKETCH_11_W, SKETCH_11_H)
    extrude(amount=-EXTRUDE_2_DEPTH)

    # Фаска3
    chamfer_3_edges = [part.edges().sort_by_distance(p)[0] for p in [
        (72.5, -76, -8.75),
        (73.5, -68.5, -8.75),
        (72.5, -76, 8.75),
        (73.5, -68.5, 8.75),
    ]]
    chamfer(chamfer_3_edges, length=CHAMFER_3_SIZE - 0.0001)  # a hair under: the kernel refuses the full size

    # Эскиз12 → Вырез-Вытянуть8 (cut)
    with BuildSketch(Plane(origin=(75, 0, 0), x_dir=(0, 0, -1), z_dir=(1, 0, 0))):
        with Locations(Location((0, -72.5, 0), (0, 0, 90))):
            Circle(SKETCH_12_R)
    extrude(amount=-CUT_EXTRUDE_8_DEPTH, mode=Mode.SUBTRACT)

    # Эскиз13 → Вырез-Вытянуть9 (cut)
    with BuildSketch(Plane(origin=(75, 0, 0), x_dir=(0, 0, -1), z_dir=(1, 0, 0))):
        with Locations(Location((6, -72.5, 0), (0, 0, 90))):
            Circle(SKETCH_13_R)
    extrude(amount=-CUT_EXTRUDE_9_DEPTH, mode=Mode.SUBTRACT)

    # Эскиз14 → Вырез-Вытянуть10 (cut)
    with BuildSketch(Plane.XZ.offset(77)):
        with Locations((41, 31)):
            Rectangle(SKETCH_14_W, SKETCH_14_H)
    extrude(amount=-CUT_EXTRUDE_10_DEPTH, mode=Mode.SUBTRACT)


solid = part.part
